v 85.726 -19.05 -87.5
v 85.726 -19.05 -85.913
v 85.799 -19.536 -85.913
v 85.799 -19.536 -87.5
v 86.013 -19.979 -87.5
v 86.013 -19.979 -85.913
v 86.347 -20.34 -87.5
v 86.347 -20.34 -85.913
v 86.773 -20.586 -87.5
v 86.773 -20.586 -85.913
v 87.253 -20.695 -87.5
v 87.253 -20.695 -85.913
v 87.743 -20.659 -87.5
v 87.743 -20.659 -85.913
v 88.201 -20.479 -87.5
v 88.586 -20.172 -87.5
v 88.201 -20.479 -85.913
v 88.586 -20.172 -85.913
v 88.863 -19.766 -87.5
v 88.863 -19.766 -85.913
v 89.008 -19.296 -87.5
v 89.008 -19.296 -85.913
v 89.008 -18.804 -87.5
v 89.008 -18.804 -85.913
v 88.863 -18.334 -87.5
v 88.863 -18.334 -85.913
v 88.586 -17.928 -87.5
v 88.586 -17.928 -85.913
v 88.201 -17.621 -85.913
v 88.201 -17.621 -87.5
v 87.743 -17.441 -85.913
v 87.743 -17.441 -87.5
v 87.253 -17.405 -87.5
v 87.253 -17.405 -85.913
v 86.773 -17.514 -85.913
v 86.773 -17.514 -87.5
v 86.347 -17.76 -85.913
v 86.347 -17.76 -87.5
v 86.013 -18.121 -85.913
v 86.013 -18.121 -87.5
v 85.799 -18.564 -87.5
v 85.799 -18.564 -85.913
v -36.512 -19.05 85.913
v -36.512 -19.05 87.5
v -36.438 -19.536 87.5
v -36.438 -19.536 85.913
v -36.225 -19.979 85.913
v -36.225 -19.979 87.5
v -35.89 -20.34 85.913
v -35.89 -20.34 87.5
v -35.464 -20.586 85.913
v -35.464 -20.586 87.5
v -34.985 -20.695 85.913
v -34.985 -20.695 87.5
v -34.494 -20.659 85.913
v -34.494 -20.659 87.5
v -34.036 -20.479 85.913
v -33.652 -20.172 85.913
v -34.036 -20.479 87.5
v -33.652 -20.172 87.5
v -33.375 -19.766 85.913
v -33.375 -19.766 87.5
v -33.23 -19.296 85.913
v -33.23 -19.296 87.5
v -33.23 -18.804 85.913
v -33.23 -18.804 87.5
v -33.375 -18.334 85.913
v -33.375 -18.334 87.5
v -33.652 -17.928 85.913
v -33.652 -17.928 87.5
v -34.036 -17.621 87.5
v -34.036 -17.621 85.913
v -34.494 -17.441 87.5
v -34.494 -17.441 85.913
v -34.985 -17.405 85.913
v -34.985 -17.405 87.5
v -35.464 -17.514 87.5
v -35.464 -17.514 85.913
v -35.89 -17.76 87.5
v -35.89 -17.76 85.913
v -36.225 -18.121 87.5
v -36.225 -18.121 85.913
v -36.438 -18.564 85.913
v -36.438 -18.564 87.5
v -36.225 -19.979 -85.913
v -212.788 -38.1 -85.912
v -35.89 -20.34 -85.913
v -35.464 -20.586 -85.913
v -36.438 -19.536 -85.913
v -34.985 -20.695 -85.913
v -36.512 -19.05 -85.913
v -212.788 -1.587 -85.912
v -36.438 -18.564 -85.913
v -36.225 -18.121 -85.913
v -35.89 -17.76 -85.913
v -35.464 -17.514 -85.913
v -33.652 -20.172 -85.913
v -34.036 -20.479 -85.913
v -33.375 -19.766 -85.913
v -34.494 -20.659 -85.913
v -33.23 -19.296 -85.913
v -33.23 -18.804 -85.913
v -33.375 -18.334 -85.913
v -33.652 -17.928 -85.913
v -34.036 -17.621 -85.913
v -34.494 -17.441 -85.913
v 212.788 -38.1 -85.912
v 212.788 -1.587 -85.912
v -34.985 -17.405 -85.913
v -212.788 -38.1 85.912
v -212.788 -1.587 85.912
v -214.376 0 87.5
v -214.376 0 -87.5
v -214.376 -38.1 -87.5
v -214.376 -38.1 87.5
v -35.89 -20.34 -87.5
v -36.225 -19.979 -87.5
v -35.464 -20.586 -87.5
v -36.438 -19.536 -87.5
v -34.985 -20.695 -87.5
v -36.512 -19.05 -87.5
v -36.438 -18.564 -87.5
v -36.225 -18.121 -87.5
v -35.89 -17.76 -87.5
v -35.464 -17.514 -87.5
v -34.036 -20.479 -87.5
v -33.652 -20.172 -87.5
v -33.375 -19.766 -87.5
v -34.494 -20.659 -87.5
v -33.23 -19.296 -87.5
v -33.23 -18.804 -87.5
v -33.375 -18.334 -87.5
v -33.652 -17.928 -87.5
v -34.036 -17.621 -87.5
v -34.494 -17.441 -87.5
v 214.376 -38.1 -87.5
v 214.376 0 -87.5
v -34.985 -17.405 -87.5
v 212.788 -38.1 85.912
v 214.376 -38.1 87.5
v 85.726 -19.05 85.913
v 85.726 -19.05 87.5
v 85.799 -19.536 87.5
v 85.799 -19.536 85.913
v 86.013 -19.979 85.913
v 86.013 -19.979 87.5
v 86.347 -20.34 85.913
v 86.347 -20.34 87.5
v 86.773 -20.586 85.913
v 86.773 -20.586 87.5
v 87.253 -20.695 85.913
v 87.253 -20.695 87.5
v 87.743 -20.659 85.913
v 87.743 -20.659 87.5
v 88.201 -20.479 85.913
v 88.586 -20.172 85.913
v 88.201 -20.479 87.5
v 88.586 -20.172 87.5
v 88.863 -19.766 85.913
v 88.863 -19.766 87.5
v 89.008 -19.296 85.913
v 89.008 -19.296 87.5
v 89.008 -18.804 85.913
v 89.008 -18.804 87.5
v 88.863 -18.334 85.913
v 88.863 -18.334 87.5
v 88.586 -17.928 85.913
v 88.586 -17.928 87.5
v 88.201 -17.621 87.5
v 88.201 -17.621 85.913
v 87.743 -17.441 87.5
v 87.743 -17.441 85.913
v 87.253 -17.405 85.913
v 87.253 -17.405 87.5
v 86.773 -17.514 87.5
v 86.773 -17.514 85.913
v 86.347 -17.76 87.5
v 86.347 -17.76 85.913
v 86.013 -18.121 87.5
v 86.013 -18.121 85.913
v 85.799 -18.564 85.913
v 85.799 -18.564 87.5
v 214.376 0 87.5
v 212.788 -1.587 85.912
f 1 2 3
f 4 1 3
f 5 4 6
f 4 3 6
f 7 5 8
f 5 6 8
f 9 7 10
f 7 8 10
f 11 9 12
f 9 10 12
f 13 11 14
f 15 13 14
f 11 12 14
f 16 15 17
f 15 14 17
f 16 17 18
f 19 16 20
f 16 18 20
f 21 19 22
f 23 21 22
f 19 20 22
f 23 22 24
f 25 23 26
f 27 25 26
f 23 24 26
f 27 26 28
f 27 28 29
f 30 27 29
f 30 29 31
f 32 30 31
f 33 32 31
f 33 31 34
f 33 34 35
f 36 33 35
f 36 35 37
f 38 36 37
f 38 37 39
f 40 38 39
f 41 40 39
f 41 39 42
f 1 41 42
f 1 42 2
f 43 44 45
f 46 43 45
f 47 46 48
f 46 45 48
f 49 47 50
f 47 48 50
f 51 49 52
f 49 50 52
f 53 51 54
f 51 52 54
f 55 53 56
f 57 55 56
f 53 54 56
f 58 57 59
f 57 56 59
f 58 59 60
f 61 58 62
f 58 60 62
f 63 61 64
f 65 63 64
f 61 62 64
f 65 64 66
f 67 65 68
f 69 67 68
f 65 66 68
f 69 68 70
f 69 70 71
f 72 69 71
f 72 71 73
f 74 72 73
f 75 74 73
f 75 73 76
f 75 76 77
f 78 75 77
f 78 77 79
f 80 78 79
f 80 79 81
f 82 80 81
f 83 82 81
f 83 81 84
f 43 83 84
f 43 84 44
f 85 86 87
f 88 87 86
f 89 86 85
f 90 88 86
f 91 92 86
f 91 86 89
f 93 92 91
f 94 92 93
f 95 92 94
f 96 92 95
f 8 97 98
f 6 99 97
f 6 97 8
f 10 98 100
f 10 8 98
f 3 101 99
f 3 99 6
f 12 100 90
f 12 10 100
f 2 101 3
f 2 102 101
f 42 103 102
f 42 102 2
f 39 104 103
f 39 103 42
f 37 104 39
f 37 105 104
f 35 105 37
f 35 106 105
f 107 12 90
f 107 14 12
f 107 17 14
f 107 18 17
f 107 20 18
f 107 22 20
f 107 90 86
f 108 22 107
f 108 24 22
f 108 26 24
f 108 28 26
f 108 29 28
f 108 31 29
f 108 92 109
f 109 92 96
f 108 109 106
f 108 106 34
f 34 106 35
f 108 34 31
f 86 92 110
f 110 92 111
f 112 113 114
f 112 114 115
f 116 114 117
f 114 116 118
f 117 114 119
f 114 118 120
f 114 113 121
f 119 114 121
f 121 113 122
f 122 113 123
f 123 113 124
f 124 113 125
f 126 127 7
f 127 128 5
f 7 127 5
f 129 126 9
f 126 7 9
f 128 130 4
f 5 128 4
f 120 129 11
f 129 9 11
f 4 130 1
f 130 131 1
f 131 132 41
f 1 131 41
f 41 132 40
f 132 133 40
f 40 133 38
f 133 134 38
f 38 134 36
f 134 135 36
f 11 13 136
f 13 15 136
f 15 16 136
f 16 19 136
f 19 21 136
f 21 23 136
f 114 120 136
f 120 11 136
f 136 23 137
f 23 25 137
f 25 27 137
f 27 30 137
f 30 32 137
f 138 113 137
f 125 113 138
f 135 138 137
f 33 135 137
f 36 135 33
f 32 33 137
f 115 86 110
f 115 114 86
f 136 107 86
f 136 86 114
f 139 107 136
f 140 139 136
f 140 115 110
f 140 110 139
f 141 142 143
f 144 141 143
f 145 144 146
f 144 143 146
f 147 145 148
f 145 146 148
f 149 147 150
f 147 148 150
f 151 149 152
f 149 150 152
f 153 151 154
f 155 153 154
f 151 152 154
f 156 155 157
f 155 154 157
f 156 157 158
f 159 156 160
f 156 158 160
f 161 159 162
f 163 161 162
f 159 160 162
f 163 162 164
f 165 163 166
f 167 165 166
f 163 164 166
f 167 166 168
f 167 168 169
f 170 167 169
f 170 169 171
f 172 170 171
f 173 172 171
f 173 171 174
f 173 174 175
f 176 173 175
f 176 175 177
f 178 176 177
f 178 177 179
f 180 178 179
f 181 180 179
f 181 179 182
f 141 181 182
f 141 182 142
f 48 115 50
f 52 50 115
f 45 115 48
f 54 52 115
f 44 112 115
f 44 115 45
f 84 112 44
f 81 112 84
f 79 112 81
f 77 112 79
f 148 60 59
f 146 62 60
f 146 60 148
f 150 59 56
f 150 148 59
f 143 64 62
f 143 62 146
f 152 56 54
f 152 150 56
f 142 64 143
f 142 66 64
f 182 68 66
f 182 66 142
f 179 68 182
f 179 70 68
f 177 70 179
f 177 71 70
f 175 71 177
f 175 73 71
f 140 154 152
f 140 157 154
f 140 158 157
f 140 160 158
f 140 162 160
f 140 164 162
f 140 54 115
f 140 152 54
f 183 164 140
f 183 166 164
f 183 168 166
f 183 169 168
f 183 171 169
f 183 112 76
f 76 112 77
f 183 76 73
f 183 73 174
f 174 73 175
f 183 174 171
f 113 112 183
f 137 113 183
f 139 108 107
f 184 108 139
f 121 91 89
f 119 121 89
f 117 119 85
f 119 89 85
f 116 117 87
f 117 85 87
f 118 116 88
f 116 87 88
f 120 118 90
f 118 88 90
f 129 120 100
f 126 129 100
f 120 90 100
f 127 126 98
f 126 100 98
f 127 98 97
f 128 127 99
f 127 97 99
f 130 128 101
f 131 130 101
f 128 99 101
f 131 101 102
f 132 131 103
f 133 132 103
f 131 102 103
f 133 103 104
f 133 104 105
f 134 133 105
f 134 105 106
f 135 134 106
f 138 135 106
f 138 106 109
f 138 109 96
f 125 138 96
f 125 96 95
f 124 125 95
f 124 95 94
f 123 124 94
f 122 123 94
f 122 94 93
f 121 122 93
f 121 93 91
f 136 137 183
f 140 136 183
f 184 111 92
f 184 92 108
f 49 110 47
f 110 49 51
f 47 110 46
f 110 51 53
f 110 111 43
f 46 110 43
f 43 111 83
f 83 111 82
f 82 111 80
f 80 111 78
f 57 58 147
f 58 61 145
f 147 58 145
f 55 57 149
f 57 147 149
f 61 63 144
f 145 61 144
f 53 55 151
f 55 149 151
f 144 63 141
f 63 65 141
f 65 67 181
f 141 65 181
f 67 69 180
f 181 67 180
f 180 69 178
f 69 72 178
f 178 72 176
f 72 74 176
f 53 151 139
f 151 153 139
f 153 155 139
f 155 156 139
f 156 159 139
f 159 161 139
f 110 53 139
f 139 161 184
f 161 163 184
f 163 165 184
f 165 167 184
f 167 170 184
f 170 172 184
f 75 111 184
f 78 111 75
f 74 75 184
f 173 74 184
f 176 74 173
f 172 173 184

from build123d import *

# Parameters (mm, degrees)
F0_W     = 428.752
F0_H     = 175
F1_DEPTH = 38.1
F2_T     = -1.5875
F4_D     = 3.3


with BuildPart() as f1:
    # F0 (on Front) → F1 (new body)
    with BuildSketch(Plane.XZ):
        Rectangle(F0_W, F0_H)
    extrude(amount=F1_DEPTH)

    # F2
    f2_openings = [f1.faces().sort_by_distance(p)[0] for p in [
        (0, -38.1, 0),
    ]]
    offset(amount=F2_T, openings=f2_openings)

    # F4 (through all)
    with Locations(Plane(origin=(0, 0, -87.5), x_dir=(1, 0, 0), z_dir=(0, 0, -1))):
        with Locations((-34.8615, 19.05), (87.376, 19.05)):
            Hole(F4_D / 2)


solid = f1.part
